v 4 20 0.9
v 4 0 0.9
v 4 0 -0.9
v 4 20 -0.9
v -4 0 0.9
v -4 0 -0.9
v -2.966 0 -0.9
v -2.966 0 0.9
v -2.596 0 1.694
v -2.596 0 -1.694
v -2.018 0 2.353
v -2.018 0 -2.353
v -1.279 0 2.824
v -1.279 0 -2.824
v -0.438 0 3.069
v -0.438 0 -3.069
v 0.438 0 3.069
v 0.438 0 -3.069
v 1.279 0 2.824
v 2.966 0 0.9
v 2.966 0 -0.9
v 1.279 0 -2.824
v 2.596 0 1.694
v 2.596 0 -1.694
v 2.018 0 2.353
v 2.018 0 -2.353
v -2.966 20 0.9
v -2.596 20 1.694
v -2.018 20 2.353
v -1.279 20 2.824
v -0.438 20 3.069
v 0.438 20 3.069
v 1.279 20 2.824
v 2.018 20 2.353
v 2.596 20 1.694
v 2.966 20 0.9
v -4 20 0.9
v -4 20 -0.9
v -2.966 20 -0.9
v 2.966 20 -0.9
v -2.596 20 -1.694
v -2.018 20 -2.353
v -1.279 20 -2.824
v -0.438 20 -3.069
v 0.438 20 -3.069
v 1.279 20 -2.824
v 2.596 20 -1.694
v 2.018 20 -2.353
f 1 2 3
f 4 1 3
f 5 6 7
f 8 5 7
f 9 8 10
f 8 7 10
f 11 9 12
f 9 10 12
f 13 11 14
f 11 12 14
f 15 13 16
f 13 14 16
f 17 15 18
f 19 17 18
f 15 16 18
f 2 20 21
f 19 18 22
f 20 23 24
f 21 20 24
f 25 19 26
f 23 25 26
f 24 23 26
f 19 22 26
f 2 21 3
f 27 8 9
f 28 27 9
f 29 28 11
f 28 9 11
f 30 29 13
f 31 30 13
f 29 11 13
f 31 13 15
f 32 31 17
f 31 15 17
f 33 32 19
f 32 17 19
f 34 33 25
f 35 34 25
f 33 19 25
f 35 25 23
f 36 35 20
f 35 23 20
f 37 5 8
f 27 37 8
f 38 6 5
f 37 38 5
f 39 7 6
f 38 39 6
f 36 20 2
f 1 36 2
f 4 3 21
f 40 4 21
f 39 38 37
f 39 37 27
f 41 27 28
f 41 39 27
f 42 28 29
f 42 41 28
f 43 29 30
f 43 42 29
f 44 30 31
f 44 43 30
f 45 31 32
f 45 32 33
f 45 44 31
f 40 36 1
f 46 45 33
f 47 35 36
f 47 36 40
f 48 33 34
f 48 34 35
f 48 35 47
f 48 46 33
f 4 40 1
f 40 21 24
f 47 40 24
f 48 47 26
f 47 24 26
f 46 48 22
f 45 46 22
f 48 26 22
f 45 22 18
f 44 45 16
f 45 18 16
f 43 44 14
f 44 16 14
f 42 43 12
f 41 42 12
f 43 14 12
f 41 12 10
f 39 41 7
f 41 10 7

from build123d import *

# Parameters (mm, degrees)
BOSS_EXTRUDE1_DEPTH = 20


with BuildPart() as part:
    # Sketch1 → Boss-Extrude1 (new body)
    with BuildSketch(Plane(origin=(0, 0, 0), x_dir=(1, 0, 0), z_dir=(0, 1, 0))):
        with BuildLine():
            Line((-2.966479395, 0.9), (-4, 0.9))
            Line((-4, 0.9), (-4, -0.9))
            Line((-4, -0.9), (-2.966479395, -0.9))
            ThreePointArc((-2.966479395, -0.9), (-3.1, 0), (-2.966479395, 0.9))
        make_face()
        with BuildLine():
            Line((4, 0.9), (2.966479395, 0.9))
            ThreePointArc((2.966479395, 0.9), (3.066438172, 0.4549252), (3.1, 0))
            ThreePointArc((3.1, 0), (3.066438172, -0.4549252), (2.966479395, -0.9))
            Line((2.966479395, -0.9), (4, -0.9))
            Line((4, -0.9), (4, 0.9))
        make_face()
        with BuildLine():
            Line((2.966479395, 0.9), (-2.966479395, 0.9))
            ThreePointArc((-2.966479395, 0.9), (-3.1, 0), (-2.966479395, -0.9))
            Line((-2.966479395, -0.9), (2.966479395, -0.9))
            ThreePointArc((2.966479395, -0.9), (3.066438172, -0.4549252), (3.1, 0))
            ThreePointArc((3.1, 0), (3.066438172, 0.4549252), (2.966479395, 0.9))
        make_face()
        with BuildLine():
            Line((2.966479395, -0.9), (-2.966479395, -0.9))
            ThreePointArc((-2.966479395, -0.9), (0, -3.1), (2.966479395, -0.9))
        make_face()
        with BuildLine():
            ThreePointArc((2.966479395, 0.9), (0, 3.1), (-2.966479395, 0.9))
            Line((-2.966479395, 0.9), (2.966479395, 0.9))
        make_face()
    extrude(amount=BOSS_EXTRUDE1_DEPTH)


solid = part.part
